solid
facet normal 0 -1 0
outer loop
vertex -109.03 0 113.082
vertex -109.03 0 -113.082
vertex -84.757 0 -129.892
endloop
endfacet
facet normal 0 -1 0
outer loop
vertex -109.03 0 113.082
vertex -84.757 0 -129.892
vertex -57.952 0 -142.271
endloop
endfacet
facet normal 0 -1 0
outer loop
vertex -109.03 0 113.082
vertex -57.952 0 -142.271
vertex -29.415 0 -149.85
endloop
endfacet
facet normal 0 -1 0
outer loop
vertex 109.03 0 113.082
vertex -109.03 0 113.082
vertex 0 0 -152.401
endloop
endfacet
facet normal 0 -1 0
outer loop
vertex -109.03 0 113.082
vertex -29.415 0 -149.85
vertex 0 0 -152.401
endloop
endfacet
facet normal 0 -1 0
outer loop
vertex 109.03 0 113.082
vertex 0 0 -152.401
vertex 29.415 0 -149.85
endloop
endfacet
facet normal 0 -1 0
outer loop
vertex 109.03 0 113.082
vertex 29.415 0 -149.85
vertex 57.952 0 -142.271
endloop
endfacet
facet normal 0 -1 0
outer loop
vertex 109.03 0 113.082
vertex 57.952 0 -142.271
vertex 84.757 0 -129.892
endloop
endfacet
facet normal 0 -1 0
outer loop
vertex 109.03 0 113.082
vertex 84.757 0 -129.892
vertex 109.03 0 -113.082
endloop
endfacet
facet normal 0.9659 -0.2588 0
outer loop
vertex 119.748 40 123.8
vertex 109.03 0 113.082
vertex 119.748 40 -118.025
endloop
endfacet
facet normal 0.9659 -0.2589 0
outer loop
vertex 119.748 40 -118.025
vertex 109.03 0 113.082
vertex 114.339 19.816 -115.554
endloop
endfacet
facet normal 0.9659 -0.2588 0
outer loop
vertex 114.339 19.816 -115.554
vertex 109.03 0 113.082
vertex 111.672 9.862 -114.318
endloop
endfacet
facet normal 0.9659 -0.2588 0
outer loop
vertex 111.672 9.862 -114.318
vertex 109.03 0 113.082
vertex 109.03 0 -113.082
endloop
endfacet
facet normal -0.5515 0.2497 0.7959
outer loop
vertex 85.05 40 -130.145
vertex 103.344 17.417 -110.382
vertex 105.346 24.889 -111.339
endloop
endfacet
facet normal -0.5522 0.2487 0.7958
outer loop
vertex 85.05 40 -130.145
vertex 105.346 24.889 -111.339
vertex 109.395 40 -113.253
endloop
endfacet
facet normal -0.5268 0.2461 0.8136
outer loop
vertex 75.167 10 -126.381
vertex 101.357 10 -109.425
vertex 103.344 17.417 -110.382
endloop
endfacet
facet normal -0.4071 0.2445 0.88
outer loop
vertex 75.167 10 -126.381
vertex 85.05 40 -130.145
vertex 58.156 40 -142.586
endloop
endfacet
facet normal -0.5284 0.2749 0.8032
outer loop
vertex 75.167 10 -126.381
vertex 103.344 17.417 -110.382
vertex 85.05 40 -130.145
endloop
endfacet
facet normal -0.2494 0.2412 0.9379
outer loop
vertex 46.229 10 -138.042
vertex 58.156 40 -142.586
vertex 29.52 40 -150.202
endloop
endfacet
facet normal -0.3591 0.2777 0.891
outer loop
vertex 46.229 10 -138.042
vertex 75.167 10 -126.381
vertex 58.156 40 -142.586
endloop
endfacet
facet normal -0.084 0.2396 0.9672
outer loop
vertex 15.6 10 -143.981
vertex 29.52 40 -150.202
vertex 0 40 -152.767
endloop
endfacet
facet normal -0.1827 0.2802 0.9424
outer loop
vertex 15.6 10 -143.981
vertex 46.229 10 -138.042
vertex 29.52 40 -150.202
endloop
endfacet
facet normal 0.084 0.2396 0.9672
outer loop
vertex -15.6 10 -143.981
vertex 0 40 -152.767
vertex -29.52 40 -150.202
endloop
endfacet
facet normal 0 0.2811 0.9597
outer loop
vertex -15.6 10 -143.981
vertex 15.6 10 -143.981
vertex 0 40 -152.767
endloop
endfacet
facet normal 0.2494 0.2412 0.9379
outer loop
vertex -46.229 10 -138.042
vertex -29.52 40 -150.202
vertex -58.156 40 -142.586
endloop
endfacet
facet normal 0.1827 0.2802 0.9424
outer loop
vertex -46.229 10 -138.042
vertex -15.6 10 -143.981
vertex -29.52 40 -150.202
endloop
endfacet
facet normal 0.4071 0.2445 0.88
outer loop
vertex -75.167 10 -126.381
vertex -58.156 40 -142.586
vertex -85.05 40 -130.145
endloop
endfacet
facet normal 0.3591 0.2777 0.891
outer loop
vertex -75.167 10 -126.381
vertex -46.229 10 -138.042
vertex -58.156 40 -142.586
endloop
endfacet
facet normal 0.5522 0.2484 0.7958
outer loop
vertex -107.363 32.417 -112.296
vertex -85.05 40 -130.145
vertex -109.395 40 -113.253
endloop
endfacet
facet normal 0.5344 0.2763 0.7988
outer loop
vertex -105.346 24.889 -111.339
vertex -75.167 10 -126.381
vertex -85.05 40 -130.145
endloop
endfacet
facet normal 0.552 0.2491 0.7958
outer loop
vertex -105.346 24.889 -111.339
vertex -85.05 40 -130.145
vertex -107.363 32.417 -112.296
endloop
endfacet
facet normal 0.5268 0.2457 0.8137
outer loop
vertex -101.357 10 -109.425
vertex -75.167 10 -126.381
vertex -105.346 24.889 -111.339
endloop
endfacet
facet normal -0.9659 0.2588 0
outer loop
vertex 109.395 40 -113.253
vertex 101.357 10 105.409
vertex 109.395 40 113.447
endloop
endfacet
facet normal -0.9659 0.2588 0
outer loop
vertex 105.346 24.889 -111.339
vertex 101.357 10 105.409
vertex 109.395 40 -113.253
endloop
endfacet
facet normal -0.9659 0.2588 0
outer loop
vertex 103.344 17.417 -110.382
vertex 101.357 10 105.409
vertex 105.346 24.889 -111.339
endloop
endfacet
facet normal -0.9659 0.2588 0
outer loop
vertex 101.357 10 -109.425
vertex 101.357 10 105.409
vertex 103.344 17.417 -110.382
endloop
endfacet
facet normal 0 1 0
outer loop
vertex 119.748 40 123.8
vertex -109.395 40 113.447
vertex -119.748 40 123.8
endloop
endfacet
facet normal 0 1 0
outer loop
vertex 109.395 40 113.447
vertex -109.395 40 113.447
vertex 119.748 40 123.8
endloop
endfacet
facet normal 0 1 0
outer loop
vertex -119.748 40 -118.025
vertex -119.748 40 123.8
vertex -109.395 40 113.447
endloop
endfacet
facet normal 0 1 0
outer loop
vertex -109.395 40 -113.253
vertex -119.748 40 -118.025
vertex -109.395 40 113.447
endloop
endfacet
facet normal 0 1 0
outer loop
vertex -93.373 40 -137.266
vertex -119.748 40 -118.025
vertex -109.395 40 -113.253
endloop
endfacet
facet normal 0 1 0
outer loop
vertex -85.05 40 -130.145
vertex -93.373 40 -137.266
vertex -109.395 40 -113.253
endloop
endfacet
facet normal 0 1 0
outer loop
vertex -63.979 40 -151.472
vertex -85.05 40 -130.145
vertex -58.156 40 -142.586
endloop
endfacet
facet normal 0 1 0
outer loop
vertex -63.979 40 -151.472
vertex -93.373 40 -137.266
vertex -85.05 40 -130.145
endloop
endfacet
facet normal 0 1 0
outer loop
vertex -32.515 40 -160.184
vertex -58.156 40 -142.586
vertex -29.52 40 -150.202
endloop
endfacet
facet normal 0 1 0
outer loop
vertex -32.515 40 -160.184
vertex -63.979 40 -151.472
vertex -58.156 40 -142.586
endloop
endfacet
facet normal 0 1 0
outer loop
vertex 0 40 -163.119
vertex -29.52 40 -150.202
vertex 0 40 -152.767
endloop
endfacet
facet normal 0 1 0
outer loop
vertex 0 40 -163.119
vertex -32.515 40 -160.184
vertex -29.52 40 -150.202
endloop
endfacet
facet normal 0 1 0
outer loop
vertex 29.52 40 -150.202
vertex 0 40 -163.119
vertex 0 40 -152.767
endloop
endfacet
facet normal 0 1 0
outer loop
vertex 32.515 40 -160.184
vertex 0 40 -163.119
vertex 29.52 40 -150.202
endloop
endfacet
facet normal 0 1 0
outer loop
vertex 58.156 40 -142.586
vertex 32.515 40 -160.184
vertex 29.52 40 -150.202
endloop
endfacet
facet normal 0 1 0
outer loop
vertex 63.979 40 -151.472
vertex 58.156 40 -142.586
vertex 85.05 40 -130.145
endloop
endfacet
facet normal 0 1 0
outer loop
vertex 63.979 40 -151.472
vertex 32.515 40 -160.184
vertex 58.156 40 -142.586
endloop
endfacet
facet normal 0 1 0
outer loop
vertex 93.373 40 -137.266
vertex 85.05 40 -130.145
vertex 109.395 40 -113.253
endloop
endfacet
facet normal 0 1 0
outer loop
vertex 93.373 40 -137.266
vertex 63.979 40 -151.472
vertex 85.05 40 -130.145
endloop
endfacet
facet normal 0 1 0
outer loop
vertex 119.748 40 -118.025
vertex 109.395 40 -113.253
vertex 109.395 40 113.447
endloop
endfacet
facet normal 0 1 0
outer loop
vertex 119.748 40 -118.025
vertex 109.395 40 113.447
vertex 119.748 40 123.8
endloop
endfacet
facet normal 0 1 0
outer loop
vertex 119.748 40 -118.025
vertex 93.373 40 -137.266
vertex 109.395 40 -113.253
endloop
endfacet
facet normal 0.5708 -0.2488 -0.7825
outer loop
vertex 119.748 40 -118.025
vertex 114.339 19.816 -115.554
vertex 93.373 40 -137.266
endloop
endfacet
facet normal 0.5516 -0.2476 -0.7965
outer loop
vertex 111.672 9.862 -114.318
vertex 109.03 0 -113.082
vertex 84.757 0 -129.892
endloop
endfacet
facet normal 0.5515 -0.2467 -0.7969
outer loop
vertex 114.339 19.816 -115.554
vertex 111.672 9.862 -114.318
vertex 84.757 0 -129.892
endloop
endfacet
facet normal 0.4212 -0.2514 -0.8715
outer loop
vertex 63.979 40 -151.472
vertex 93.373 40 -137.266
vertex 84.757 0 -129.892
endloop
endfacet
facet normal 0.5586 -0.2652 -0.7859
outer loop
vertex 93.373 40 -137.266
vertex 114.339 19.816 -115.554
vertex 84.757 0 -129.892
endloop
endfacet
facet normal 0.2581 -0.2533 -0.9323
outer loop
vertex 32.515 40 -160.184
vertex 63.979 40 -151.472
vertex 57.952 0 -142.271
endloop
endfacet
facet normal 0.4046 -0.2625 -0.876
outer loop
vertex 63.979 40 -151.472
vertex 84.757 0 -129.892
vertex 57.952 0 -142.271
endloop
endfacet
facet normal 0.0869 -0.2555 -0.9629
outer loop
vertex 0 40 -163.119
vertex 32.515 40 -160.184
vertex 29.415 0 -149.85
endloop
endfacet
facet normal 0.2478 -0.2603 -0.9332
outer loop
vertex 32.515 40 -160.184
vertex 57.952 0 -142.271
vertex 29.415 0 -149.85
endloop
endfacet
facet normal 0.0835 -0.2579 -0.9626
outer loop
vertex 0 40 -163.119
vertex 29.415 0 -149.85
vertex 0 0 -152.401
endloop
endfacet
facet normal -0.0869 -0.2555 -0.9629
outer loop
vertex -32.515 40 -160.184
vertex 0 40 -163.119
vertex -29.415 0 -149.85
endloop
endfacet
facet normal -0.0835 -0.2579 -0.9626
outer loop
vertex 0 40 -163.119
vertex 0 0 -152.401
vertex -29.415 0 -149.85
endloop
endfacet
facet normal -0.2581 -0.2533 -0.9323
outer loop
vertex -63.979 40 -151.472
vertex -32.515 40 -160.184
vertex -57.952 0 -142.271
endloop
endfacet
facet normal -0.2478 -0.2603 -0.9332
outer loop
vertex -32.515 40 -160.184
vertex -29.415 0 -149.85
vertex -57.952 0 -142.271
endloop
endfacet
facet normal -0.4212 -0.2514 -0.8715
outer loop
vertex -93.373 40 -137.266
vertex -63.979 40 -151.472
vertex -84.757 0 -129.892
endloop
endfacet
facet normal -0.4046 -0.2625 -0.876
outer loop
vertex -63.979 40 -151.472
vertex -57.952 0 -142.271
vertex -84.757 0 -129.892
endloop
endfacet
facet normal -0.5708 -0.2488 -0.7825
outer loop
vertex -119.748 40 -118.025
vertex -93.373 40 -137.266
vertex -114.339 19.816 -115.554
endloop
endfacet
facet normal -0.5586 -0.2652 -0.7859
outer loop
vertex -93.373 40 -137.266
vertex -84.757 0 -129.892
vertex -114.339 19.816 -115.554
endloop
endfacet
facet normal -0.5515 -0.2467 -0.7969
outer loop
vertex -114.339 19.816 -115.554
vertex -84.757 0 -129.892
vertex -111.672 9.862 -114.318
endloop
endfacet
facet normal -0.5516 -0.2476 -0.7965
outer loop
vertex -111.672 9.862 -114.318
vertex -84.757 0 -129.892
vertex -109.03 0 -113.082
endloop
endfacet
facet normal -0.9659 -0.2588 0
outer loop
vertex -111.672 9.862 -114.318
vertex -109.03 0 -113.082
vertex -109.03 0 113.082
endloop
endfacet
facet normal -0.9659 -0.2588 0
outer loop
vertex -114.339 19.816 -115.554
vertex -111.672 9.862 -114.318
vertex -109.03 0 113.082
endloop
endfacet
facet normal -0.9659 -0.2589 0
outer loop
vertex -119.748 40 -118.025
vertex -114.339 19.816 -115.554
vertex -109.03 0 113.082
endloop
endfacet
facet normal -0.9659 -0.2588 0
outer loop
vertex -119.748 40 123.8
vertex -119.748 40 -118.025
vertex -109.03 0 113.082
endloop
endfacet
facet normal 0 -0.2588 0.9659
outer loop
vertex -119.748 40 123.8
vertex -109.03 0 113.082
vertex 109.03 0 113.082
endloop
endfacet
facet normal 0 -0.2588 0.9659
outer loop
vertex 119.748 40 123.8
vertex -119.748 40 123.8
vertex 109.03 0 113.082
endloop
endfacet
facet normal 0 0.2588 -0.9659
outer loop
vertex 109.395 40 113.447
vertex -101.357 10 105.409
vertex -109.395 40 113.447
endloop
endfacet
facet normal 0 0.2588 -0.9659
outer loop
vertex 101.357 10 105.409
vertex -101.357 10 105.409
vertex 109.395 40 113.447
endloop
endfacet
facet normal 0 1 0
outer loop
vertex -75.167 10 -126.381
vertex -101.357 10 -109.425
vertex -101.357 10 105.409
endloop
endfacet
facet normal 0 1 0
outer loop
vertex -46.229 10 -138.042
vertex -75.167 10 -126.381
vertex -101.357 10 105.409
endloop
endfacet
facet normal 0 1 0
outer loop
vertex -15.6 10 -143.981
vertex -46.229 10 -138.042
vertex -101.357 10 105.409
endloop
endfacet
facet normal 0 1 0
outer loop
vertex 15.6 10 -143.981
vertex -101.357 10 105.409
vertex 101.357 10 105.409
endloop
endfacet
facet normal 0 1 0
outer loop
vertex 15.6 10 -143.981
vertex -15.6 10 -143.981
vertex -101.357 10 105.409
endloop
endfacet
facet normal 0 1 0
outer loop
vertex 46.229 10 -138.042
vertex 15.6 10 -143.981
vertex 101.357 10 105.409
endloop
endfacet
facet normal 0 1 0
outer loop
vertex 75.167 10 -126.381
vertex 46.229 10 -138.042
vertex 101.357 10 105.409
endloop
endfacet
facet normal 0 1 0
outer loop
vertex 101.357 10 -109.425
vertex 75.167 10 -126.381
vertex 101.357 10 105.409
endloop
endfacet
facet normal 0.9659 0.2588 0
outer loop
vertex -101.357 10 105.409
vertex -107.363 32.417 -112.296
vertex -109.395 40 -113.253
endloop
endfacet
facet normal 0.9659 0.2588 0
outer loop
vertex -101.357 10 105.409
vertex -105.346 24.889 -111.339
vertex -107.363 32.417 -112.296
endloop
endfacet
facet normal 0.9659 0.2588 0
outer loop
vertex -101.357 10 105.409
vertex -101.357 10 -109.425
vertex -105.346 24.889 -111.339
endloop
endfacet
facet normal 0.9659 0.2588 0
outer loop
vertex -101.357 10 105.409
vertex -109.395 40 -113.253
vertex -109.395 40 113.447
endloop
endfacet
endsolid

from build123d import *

# Parameters (mm, degrees)
BOSS_EXTRUDE1_DEPTH = 40
BOSS_EXTRUDE1_DRAFT = -15
SHELL1_T            = -10


with BuildPart() as part:
    # Sketch1 → Boss-Extrude1 (with draft: the straight prism first)
    with BuildSketch(Plane(origin=(0, 0, 0), x_dir=(1, 0, 0), z_dir=(0, 1, 0))):
        with BuildLine():
            Line((-109.029856613, -113.081906669), (109.029856613, -113.081906669))
            Line((109.029856613, -113.081906669), (109.029856613, 113.081906669))
            ThreePointArc((109.029856613, 113.081906669), (0, 152.401411753), (-109.029856613, 113.081906669))
            Line((-109.029856613, 113.081906669), (-109.029856613, -113.081906669))
        make_face()
    extrude(amount=BOSS_EXTRUDE1_DEPTH)
    # Boss-Extrude1: the draft: its side faces are tilted about the plane it starts from
    boss_extrude1_sides = [part.faces().sort_by_distance(p)[0] for p in [
        (0, 20, 113.081906669),
        (109.029856613, 20, 0),
        (0, 20, -152.401411753),
        (-109.029856613, 20, 0),
    ]]
    draft(boss_extrude1_sides, Plane(origin=(0, 0, 0), x_dir=(1, 0, 0), z_dir=(0, 1, 0)), BOSS_EXTRUDE1_DRAFT)

    # Shell1
    shell1_openings = [part.faces().sort_by_distance(p)[0] for p in [
        (0, 40, -12.878837242),
    ]]
    offset(amount=SHELL1_T, openings=shell1_openings, kind=Kind.INTERSECTION)


solid = part.part
